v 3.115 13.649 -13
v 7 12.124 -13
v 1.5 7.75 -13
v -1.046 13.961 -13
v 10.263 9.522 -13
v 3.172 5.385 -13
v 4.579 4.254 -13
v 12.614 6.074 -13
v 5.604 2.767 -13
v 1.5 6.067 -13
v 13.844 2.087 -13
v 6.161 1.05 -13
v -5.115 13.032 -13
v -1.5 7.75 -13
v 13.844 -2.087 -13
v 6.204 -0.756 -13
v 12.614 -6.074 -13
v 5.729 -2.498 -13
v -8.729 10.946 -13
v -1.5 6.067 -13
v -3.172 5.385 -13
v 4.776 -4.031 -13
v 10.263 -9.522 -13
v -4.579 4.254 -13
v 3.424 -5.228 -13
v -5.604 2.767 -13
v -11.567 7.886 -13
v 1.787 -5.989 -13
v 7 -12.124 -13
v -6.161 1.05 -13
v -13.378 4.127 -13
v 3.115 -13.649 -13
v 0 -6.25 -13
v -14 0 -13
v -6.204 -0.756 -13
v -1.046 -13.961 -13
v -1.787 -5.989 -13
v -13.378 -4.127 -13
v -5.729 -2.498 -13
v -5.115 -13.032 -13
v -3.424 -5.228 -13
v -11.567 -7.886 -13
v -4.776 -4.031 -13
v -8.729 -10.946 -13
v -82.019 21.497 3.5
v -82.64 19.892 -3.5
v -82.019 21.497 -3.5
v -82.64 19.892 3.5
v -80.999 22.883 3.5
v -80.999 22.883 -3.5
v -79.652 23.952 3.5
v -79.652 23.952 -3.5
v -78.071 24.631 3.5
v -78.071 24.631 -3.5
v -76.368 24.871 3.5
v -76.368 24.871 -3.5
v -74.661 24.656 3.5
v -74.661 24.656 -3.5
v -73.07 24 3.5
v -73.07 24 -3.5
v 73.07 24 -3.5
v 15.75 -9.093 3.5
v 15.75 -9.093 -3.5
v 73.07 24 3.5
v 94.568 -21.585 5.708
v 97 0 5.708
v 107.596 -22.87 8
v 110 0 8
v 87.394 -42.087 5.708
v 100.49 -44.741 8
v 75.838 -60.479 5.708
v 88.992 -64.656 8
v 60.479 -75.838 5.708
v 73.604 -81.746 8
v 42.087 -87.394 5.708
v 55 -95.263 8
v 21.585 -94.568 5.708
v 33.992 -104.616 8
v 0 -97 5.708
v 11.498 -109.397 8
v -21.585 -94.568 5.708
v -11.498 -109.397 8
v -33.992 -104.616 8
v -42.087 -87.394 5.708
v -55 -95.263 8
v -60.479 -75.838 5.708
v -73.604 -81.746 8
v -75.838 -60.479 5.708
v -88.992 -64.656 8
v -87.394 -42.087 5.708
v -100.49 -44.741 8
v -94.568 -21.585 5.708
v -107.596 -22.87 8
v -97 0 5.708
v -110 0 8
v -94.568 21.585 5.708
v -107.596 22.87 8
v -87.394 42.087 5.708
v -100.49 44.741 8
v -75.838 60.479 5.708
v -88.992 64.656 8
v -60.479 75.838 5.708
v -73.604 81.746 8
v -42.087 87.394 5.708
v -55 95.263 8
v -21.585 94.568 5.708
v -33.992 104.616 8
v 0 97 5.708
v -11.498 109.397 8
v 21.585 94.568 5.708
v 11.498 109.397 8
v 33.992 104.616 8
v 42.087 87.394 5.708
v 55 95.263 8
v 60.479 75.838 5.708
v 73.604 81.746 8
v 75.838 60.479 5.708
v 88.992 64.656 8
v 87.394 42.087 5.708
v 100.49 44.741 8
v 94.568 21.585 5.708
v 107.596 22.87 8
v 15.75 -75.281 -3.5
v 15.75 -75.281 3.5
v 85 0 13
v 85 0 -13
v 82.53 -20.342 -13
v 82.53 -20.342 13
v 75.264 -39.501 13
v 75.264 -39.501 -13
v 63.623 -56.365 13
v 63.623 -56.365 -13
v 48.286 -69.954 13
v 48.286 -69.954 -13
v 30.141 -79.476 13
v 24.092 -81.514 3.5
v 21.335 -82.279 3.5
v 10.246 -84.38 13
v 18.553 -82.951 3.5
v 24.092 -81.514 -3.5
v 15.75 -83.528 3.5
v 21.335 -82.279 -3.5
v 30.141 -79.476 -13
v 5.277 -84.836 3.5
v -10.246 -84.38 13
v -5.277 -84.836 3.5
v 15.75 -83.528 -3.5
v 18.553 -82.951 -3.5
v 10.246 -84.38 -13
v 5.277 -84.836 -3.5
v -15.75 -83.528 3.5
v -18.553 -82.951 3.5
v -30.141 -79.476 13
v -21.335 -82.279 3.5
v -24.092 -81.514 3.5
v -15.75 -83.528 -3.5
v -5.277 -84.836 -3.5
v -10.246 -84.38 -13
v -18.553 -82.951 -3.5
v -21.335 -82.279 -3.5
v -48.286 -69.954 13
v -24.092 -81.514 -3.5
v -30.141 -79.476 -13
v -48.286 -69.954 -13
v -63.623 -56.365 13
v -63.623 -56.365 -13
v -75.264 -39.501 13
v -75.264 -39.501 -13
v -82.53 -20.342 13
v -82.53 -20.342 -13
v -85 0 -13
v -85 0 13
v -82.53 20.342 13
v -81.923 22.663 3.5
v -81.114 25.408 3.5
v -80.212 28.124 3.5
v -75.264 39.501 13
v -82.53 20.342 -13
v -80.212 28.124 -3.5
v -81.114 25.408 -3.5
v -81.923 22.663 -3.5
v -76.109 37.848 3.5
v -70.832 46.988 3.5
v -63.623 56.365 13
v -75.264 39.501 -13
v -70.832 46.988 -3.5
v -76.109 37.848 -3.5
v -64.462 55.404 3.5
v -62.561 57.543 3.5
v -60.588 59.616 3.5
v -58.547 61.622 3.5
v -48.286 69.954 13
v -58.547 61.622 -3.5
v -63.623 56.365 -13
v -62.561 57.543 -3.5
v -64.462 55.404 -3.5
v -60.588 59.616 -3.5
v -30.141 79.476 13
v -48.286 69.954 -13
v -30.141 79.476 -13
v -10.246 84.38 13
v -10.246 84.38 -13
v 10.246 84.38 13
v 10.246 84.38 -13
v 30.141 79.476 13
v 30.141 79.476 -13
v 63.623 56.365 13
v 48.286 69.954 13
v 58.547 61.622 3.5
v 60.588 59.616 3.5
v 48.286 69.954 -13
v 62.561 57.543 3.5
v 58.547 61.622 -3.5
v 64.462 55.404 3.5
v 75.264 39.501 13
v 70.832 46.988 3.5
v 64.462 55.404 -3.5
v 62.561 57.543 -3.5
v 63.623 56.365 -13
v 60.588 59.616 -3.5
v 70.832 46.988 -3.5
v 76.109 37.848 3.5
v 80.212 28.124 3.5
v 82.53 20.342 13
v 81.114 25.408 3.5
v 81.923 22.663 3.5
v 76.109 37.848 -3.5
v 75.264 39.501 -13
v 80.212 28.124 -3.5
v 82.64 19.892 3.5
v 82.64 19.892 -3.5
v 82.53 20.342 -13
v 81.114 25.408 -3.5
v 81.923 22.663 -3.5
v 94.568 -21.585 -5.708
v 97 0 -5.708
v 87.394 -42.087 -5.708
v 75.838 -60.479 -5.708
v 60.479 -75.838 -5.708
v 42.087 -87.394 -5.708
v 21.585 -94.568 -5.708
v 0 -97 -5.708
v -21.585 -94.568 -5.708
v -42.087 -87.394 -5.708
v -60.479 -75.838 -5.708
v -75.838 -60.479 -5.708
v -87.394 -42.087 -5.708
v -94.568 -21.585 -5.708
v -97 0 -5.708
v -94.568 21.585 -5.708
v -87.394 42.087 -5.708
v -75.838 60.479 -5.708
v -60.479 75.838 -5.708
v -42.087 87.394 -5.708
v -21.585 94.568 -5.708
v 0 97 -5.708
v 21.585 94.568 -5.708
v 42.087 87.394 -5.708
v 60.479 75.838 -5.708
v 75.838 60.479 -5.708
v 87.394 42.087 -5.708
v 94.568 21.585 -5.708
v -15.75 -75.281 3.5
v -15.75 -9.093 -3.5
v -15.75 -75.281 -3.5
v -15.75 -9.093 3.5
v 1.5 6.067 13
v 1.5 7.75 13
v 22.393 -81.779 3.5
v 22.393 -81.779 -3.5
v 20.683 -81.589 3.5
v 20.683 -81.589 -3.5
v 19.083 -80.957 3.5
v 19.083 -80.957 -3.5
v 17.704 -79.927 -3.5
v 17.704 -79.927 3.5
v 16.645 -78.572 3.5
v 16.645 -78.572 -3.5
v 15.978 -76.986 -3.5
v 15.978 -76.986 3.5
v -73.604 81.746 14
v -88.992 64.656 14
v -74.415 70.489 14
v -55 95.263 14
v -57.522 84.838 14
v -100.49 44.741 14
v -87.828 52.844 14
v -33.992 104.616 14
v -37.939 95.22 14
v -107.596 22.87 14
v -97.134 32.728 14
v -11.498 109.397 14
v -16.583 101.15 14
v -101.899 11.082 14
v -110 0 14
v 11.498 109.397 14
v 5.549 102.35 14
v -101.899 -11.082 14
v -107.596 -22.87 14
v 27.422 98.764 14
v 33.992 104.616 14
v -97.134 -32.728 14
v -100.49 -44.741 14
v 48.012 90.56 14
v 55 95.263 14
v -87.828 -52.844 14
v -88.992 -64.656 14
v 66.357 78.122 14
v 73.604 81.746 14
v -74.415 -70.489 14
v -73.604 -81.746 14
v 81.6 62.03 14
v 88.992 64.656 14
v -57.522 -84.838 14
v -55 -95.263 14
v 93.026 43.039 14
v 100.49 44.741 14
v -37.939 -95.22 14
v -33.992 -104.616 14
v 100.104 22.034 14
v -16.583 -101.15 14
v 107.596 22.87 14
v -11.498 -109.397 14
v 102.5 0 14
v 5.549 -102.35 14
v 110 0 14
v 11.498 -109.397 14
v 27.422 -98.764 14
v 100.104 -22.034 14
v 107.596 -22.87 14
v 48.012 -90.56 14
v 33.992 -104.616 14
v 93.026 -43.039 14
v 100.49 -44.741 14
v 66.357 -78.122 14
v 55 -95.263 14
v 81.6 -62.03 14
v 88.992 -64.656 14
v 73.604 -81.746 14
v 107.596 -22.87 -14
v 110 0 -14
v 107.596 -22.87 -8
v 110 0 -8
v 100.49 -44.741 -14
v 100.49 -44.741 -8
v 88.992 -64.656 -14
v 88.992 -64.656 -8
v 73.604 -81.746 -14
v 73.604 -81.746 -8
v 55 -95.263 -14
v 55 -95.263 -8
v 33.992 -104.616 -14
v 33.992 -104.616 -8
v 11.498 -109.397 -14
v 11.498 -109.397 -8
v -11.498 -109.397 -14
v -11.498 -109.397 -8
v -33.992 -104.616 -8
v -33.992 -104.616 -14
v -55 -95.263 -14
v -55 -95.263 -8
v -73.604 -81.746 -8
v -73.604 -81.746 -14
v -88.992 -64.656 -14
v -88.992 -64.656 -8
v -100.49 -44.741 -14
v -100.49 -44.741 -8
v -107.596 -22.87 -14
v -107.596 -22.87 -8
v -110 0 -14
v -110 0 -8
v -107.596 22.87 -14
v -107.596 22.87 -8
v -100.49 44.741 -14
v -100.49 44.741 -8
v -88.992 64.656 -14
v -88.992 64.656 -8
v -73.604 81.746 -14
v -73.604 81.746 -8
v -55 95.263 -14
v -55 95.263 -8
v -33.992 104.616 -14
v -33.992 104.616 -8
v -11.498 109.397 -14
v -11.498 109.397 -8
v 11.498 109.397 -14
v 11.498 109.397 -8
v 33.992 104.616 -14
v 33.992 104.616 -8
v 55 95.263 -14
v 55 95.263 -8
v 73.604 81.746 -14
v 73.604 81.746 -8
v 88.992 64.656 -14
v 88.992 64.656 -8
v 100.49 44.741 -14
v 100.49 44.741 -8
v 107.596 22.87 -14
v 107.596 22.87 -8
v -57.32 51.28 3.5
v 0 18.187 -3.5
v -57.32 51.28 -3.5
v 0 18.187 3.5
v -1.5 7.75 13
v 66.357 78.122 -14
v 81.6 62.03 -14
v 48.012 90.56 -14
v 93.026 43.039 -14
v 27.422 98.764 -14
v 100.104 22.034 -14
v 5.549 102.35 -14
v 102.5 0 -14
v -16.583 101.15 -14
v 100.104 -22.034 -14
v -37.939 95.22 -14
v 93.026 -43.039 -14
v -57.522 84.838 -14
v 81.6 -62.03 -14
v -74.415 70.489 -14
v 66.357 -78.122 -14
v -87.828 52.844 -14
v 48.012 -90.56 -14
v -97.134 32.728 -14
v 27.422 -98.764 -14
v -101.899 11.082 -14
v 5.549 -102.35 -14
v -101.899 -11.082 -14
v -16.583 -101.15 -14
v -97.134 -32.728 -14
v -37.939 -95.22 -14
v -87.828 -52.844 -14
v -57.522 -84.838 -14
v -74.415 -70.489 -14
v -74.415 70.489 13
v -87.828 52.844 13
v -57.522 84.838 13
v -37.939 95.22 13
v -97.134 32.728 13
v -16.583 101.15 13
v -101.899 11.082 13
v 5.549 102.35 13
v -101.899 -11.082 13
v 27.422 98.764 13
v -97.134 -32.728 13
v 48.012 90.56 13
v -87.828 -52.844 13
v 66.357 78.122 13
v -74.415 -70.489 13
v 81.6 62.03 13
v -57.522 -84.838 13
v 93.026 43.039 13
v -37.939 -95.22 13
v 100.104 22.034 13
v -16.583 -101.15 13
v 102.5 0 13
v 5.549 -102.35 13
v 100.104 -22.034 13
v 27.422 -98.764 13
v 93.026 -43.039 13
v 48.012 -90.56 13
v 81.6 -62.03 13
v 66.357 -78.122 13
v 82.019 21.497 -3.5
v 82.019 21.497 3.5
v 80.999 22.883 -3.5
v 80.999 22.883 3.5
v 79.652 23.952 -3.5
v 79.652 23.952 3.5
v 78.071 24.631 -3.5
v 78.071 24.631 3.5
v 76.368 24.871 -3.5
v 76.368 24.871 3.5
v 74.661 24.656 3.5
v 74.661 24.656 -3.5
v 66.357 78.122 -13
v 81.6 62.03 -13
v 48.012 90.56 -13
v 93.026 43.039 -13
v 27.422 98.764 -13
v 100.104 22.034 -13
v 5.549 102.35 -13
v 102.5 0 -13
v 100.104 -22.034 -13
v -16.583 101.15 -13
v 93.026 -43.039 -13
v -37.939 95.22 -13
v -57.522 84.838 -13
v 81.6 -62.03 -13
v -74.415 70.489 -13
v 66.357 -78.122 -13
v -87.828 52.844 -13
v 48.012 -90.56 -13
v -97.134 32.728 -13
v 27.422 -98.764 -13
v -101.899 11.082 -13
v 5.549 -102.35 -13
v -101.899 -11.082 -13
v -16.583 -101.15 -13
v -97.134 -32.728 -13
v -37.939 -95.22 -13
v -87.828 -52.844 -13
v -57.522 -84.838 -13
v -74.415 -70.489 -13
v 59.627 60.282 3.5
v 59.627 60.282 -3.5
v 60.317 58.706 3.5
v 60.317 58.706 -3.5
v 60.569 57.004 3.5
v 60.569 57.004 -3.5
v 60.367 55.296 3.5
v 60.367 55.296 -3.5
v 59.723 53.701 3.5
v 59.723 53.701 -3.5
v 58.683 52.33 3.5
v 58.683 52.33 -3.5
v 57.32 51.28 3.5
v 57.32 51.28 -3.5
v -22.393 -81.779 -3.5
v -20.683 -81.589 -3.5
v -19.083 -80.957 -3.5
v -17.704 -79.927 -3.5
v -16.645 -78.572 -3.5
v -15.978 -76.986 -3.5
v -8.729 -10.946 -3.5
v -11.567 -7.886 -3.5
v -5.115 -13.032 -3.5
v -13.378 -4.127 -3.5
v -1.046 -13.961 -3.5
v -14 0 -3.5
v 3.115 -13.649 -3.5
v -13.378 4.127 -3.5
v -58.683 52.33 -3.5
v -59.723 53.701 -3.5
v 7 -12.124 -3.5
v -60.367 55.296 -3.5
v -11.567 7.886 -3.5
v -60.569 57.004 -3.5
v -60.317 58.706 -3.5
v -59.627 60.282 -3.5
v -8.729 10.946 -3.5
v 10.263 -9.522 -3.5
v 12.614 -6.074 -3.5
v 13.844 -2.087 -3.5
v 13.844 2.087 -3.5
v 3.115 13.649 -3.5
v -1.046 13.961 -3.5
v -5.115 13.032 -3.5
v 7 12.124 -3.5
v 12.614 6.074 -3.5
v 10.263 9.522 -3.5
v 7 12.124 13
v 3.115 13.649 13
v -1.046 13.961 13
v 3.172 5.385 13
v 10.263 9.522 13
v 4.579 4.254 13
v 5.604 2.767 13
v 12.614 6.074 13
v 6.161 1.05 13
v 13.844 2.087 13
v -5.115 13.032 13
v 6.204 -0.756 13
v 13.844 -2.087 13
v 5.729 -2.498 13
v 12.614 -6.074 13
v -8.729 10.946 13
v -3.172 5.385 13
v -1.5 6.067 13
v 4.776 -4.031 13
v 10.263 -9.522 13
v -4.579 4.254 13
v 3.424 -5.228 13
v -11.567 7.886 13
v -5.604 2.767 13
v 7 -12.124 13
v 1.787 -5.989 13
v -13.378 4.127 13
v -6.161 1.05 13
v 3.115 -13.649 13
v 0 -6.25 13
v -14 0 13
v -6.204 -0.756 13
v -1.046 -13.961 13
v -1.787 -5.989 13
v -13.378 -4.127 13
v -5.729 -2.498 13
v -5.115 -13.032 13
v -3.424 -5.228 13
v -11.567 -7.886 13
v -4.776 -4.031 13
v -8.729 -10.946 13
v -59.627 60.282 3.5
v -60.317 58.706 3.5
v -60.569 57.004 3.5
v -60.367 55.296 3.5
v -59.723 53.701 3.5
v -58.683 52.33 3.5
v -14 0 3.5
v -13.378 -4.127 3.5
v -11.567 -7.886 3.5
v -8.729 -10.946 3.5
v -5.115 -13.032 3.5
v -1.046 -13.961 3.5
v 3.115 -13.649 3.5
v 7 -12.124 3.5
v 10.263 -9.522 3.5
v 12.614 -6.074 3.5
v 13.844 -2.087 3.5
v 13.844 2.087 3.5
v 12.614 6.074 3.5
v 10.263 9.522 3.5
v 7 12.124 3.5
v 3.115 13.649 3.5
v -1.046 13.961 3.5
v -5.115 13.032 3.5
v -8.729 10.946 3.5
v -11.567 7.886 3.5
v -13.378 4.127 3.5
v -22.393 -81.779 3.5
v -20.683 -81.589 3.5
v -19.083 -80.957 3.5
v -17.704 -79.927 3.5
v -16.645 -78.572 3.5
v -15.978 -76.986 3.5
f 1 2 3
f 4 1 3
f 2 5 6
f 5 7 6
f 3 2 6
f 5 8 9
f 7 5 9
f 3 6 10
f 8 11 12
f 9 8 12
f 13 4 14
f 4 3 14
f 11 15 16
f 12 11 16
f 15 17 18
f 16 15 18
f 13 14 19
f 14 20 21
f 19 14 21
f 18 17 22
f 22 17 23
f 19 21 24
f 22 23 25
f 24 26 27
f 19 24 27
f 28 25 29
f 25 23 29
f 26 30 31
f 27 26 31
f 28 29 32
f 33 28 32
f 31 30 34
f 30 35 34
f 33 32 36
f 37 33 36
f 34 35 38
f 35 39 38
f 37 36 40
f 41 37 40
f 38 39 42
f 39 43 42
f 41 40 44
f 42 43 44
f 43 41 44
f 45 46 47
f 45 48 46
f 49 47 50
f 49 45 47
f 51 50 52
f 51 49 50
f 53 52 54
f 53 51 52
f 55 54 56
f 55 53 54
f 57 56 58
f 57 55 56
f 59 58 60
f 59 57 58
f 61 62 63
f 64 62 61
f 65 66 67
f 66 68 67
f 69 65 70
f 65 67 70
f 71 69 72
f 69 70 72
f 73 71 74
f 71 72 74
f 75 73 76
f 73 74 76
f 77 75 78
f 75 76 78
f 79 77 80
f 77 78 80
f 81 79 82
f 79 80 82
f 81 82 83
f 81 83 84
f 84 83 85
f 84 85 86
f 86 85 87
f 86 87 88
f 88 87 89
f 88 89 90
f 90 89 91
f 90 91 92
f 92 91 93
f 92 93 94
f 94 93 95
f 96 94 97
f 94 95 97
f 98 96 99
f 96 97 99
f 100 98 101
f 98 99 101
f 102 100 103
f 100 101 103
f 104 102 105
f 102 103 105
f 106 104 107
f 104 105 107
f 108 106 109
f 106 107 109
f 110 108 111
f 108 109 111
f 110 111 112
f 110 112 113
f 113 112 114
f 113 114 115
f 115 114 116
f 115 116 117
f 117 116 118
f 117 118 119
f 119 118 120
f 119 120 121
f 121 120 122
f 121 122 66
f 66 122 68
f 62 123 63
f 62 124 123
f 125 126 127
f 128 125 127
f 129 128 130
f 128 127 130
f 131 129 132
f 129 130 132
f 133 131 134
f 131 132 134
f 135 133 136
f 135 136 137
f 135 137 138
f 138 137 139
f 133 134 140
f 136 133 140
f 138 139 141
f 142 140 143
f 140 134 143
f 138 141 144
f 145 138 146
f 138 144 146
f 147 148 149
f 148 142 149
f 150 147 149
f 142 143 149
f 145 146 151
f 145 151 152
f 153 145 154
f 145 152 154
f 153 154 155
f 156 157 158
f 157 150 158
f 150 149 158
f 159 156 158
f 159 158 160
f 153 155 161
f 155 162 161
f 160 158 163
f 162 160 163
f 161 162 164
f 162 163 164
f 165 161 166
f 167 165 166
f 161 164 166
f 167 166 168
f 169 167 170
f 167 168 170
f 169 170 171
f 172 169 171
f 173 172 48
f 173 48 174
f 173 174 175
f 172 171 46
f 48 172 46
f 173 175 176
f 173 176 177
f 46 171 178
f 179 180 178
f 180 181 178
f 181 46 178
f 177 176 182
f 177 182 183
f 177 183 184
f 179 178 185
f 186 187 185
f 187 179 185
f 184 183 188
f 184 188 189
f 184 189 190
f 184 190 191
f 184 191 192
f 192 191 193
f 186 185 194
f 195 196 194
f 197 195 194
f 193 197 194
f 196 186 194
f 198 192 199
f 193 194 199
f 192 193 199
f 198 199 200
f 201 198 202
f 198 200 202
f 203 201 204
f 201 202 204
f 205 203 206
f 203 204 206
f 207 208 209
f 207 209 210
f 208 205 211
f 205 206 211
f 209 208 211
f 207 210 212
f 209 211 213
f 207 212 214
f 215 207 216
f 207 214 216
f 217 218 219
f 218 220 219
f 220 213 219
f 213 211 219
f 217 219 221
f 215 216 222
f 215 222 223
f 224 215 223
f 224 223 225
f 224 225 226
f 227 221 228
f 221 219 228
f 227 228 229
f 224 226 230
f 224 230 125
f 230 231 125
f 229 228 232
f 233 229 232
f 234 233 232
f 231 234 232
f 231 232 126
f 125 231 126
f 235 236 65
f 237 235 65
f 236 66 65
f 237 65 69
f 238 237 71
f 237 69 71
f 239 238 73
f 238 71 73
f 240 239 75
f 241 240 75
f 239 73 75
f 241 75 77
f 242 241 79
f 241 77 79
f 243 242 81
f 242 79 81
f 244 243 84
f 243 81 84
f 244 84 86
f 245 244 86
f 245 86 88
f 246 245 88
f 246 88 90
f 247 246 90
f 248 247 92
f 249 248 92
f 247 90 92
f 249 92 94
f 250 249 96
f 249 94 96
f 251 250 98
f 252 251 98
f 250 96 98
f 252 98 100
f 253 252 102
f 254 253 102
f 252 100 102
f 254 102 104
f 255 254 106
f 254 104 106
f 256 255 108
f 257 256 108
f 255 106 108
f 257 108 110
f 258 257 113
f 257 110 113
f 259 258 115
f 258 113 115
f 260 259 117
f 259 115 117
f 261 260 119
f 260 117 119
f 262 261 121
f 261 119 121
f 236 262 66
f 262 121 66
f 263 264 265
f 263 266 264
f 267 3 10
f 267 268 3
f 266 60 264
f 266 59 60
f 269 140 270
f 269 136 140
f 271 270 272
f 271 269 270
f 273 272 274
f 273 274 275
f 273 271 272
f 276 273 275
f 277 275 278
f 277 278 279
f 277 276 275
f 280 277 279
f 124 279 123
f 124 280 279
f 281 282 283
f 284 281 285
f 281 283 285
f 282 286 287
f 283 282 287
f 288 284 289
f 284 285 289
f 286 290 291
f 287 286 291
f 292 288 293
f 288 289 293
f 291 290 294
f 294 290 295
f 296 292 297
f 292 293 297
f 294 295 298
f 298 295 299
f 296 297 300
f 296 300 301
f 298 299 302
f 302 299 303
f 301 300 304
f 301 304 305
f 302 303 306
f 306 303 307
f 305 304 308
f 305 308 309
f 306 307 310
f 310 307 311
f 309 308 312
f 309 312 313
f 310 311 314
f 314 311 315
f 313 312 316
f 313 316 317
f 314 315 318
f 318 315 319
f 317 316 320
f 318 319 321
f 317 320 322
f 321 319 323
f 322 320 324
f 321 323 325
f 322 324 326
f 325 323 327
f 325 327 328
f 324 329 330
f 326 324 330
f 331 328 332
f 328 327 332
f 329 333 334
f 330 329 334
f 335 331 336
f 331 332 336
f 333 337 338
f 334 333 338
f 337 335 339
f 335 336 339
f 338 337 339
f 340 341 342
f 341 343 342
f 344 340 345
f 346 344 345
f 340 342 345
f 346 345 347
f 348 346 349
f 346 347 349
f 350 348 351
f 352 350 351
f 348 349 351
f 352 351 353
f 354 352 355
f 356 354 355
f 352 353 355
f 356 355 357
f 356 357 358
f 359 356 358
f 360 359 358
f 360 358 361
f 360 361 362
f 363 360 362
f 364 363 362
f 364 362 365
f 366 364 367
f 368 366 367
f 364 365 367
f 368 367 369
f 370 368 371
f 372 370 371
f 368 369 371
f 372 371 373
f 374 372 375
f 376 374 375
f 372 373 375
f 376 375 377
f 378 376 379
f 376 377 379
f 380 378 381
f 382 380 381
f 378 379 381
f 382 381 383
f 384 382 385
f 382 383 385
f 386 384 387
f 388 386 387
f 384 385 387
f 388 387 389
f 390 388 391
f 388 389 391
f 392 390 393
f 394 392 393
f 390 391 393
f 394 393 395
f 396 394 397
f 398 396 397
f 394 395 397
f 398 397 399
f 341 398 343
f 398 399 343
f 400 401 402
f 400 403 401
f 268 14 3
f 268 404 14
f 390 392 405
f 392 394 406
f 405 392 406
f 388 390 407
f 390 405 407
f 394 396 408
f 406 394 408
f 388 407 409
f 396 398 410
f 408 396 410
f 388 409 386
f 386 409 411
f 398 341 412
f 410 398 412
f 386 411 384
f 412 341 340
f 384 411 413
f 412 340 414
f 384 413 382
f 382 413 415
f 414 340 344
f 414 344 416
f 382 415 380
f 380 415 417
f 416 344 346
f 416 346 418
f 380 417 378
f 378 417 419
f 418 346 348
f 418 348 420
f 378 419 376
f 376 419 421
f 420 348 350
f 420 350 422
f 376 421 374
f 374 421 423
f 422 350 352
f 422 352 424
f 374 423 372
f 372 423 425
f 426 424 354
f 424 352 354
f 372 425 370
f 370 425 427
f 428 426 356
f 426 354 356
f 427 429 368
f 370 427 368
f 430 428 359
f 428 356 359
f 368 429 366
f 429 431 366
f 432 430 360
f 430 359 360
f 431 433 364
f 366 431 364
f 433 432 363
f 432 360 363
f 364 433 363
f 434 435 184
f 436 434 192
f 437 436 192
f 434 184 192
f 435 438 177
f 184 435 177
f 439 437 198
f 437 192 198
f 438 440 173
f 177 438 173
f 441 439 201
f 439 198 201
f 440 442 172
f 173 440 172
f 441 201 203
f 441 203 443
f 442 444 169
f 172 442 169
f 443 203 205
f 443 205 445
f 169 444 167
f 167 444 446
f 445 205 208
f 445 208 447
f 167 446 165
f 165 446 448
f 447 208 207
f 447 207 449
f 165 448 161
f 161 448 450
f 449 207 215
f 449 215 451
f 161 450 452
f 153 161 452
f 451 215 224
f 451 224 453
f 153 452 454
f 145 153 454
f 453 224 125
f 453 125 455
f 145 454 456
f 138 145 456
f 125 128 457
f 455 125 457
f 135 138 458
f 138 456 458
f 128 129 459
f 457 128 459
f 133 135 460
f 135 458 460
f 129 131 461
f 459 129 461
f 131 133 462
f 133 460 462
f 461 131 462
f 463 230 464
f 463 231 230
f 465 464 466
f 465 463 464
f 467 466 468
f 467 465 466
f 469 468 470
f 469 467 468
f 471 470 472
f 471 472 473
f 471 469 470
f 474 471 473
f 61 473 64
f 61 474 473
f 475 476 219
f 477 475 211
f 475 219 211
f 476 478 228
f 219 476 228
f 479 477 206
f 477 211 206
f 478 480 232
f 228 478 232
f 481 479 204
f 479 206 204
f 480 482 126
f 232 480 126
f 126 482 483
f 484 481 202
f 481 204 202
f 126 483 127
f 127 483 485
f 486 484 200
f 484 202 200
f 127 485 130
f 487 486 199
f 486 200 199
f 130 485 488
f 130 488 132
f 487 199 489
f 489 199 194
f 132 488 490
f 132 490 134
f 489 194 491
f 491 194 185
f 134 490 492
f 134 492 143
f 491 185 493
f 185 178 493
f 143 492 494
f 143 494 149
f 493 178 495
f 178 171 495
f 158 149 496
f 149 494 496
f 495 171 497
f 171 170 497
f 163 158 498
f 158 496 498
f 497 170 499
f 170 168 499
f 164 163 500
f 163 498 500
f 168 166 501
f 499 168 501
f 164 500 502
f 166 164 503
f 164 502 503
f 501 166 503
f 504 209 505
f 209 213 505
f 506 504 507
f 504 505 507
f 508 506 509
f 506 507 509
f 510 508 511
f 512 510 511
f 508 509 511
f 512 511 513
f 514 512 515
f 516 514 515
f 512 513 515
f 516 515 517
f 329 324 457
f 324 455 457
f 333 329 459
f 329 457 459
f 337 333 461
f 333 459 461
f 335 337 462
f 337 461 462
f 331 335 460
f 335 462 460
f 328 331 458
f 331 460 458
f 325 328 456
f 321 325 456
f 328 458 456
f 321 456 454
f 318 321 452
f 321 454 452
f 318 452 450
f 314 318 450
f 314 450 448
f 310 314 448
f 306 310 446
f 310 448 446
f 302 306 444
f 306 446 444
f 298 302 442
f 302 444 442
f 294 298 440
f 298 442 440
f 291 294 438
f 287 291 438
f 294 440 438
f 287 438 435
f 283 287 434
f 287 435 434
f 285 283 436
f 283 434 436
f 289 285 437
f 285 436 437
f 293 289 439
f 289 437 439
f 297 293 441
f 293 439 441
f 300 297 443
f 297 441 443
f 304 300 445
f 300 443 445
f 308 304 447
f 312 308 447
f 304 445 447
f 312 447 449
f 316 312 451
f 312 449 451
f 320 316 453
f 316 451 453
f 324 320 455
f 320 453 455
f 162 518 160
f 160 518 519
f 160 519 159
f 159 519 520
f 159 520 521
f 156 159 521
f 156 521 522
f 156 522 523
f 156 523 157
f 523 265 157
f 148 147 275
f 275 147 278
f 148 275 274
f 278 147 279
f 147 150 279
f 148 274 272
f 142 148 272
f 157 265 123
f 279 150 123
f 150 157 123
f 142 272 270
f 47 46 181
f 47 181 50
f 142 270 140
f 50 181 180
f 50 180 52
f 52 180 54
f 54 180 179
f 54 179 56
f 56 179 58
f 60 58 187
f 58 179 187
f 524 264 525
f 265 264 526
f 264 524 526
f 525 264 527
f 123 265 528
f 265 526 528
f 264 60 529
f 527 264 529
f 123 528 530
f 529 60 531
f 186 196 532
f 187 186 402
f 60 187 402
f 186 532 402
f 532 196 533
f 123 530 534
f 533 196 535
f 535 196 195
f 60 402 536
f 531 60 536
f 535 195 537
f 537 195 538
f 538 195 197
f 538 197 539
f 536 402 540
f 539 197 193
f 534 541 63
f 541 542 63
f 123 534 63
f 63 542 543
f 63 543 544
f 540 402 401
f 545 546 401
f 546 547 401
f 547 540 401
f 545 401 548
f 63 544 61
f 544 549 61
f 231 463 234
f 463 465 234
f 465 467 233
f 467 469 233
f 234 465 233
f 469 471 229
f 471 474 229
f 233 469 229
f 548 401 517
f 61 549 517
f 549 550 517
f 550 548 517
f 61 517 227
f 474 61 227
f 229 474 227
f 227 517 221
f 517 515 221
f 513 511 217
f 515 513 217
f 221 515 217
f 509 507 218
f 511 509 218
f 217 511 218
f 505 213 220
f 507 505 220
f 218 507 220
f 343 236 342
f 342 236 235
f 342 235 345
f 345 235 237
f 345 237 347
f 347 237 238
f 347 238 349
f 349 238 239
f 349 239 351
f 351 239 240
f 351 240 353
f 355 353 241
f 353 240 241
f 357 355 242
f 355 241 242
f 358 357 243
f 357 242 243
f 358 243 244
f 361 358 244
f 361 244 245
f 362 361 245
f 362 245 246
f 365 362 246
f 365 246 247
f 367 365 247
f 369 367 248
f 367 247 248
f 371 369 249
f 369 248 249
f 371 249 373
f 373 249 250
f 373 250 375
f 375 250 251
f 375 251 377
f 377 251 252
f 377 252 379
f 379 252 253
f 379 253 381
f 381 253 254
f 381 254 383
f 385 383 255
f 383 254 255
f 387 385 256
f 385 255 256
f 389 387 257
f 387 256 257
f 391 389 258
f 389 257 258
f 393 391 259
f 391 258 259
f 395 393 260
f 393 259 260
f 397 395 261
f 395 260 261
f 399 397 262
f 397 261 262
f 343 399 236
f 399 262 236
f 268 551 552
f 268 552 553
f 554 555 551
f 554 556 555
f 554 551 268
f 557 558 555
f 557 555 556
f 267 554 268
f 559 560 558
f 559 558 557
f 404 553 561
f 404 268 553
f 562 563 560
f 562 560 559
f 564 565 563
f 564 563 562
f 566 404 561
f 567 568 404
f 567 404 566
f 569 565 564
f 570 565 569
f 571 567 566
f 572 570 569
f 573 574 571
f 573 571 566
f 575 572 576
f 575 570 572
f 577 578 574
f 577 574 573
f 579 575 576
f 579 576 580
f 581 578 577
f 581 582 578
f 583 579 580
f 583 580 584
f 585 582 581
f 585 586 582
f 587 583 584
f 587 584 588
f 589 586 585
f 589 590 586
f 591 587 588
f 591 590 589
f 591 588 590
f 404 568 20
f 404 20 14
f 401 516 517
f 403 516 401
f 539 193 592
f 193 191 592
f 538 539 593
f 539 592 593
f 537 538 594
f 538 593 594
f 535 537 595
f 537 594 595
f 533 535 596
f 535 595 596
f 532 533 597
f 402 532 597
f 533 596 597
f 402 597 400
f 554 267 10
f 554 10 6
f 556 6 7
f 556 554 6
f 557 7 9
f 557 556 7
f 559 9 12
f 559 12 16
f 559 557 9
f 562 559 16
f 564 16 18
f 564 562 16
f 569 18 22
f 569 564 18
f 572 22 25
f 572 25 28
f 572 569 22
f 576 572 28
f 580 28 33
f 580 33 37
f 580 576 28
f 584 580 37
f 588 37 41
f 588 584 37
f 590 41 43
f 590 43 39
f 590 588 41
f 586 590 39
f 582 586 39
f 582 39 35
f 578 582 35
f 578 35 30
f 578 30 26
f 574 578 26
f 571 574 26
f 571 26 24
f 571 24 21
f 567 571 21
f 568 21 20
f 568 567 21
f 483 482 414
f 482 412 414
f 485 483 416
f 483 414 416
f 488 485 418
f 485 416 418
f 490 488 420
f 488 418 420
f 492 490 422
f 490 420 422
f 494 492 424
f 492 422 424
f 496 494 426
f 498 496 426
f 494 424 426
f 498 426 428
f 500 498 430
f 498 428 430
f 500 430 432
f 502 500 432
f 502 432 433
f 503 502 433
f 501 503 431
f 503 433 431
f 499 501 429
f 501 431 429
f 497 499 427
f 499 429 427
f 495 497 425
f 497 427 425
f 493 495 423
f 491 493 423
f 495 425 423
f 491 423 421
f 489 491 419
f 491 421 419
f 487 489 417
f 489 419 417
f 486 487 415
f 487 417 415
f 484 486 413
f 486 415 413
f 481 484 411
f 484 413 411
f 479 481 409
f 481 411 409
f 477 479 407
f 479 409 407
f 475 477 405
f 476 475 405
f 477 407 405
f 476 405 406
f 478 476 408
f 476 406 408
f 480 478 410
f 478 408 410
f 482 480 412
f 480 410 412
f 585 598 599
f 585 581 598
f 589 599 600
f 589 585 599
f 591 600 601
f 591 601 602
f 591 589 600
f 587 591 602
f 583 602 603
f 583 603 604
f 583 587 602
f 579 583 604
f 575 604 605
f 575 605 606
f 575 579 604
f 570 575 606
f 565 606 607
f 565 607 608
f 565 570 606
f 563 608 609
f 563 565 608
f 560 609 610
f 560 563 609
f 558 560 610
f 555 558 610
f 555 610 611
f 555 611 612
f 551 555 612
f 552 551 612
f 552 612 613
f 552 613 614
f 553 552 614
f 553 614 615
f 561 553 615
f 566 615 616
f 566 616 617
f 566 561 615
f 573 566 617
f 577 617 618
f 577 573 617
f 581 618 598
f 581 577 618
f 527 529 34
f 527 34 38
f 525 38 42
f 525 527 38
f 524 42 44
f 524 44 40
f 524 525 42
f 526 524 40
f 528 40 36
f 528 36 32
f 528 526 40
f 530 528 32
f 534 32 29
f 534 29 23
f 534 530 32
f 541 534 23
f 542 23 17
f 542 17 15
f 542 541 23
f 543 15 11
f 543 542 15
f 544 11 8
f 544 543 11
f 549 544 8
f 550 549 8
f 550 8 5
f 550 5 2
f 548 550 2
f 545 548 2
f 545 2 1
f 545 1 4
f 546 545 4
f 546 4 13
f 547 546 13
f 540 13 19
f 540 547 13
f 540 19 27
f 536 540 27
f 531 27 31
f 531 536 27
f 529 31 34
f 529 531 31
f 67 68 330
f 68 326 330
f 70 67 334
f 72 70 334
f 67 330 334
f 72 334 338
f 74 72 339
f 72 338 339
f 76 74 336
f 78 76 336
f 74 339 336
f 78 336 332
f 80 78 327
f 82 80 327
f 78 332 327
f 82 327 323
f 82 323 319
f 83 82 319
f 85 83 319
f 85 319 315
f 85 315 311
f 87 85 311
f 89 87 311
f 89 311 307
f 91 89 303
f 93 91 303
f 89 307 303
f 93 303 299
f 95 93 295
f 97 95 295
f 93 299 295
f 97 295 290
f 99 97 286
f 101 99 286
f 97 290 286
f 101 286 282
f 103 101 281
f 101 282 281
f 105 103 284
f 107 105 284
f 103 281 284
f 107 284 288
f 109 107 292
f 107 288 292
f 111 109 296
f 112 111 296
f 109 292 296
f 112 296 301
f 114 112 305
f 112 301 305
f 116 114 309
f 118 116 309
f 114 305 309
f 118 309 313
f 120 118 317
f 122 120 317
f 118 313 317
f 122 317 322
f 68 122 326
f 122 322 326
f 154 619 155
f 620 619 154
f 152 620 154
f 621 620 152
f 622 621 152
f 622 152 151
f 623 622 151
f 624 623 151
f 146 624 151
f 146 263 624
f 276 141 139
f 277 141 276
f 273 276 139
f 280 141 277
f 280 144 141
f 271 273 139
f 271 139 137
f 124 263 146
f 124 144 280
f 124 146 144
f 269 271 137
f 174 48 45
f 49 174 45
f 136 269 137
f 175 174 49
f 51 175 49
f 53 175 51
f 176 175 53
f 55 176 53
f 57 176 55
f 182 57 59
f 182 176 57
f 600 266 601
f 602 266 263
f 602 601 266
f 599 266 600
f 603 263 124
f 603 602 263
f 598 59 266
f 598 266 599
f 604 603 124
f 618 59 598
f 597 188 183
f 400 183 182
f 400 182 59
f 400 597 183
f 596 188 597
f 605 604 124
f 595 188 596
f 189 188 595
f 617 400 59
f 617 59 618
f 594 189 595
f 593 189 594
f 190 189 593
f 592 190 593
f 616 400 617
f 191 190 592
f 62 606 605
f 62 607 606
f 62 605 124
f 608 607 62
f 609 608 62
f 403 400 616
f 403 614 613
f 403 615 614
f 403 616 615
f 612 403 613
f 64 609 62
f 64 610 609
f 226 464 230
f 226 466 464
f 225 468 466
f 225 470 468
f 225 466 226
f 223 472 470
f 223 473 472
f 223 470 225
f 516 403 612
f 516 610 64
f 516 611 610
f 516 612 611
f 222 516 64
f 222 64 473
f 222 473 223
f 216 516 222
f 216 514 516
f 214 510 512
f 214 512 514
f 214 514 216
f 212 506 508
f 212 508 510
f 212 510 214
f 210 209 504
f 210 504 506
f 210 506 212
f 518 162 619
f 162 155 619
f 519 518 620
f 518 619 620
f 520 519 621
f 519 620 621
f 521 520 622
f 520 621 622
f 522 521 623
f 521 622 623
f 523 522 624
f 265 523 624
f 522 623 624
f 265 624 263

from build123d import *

# Parameters (mm, degrees)
EXTRUDE_1_DEPTH     = 3.5
FILLET_1_R          = 6.5
SKETCH_4_R          = 14
EXTRUDE_2_DEPTH     = 13
CUT_EXTRUDE_1_DEPTH = 13


with BuildPart() as part:
    # 草图2 → 旋转1 (revolve)
    with BuildSketch(Plane(origin=(0, 0, 0), x_dir=(0, 0, -1), z_dir=(1, 0, 0)), mode=Mode.PRIVATE) as revolve_1_sk:
        Polygon((14, 102.5), (14, 110), (8, 110), (5.707749251, 97), (-5.707749251, 97), (-8, 110), (-14, 110), (-14, 102.5), (-13, 102.5), (-13, 85), (13, 85), (13, 102.5), align=None)
    revolve(revolve_1_sk.sketch.rotate(Axis((0, 0, 67.916666667), (0, 0, -1)), 90), axis=Axis((0, 0, 67.916666667), (0, 0, -1)))

    # 草图3 → 凸台-拉伸1 (add, symmetric)
    with BuildSketch(Plane.XY):
        with BuildLine():
            Line((0, 18.186533479), (-64.462425479, 55.403932183))
            ThreePointArc((-64.462425479, 55.403932183), (-73.612159322, 42.5), (-80.212425479, 28.124131963))
            Line((-80.212425479, 28.124131963), (-15.75, -9.09326674))
            Line((-15.75, -9.09326674), (-15.75, -83.528064146))
            ThreePointArc((-15.75, -83.528064146), (0, -85), (15.75, -83.528064146))
            Line((15.75, -83.528064146), (15.75, -9.09326674))
            Line((15.75, -9.09326674), (80.212425479, 28.124131963))
            ThreePointArc((80.212425479, 28.124131963), (73.612159322, 42.5), (64.462425479, 55.403932183))
            Line((64.462425479, 55.403932183), (0, 18.186533479))
        make_face()
    extrude(amount=EXTRUDE_1_DEPTH, both=True)

    # 圆角1
    fillet_1_edges = [part.edges().sort_by_distance(p)[0] for p in [
        (64.462425479, 55.403932183, 0),
        (-64.462425479, 55.403932183, 0),
        (-80.212425479, 28.124131963, 0),
        (-15.75, -83.528064146, 0),
        (15.75, -83.528064146, 0),
        (80.212425479, 28.124131963, 0),
    ]]
    fillet(fillet_1_edges, radius=FILLET_1_R)

    # 草图4 → 凸台-拉伸2 (add, symmetric)
    with BuildSketch(Plane.XY):
        with Locations(Location((0, 0, 0), (0, 0, 180))):
            Circle(SKETCH_4_R)
    extrude(amount=EXTRUDE_2_DEPTH, both=True)

    # 草图5 → 切除-拉伸1 (cut, symmetric)
    with BuildSketch(Plane.XY):
        with BuildLine():
            Line((-1.5, 6.06733055), (-1.5, 7.75))
            Line((-1.5, 7.75), (1.5, 7.75))
            Line((1.5, 7.75), (1.5, 6.06733055))
            ThreePointArc((1.5, 6.06733055), (0, -6.25), (-1.5, 6.06733055))
        make_face()
    extrude(amount=CUT_EXTRUDE_1_DEPTH, both=True, mode=Mode.SUBTRACT)


solid = part.part
